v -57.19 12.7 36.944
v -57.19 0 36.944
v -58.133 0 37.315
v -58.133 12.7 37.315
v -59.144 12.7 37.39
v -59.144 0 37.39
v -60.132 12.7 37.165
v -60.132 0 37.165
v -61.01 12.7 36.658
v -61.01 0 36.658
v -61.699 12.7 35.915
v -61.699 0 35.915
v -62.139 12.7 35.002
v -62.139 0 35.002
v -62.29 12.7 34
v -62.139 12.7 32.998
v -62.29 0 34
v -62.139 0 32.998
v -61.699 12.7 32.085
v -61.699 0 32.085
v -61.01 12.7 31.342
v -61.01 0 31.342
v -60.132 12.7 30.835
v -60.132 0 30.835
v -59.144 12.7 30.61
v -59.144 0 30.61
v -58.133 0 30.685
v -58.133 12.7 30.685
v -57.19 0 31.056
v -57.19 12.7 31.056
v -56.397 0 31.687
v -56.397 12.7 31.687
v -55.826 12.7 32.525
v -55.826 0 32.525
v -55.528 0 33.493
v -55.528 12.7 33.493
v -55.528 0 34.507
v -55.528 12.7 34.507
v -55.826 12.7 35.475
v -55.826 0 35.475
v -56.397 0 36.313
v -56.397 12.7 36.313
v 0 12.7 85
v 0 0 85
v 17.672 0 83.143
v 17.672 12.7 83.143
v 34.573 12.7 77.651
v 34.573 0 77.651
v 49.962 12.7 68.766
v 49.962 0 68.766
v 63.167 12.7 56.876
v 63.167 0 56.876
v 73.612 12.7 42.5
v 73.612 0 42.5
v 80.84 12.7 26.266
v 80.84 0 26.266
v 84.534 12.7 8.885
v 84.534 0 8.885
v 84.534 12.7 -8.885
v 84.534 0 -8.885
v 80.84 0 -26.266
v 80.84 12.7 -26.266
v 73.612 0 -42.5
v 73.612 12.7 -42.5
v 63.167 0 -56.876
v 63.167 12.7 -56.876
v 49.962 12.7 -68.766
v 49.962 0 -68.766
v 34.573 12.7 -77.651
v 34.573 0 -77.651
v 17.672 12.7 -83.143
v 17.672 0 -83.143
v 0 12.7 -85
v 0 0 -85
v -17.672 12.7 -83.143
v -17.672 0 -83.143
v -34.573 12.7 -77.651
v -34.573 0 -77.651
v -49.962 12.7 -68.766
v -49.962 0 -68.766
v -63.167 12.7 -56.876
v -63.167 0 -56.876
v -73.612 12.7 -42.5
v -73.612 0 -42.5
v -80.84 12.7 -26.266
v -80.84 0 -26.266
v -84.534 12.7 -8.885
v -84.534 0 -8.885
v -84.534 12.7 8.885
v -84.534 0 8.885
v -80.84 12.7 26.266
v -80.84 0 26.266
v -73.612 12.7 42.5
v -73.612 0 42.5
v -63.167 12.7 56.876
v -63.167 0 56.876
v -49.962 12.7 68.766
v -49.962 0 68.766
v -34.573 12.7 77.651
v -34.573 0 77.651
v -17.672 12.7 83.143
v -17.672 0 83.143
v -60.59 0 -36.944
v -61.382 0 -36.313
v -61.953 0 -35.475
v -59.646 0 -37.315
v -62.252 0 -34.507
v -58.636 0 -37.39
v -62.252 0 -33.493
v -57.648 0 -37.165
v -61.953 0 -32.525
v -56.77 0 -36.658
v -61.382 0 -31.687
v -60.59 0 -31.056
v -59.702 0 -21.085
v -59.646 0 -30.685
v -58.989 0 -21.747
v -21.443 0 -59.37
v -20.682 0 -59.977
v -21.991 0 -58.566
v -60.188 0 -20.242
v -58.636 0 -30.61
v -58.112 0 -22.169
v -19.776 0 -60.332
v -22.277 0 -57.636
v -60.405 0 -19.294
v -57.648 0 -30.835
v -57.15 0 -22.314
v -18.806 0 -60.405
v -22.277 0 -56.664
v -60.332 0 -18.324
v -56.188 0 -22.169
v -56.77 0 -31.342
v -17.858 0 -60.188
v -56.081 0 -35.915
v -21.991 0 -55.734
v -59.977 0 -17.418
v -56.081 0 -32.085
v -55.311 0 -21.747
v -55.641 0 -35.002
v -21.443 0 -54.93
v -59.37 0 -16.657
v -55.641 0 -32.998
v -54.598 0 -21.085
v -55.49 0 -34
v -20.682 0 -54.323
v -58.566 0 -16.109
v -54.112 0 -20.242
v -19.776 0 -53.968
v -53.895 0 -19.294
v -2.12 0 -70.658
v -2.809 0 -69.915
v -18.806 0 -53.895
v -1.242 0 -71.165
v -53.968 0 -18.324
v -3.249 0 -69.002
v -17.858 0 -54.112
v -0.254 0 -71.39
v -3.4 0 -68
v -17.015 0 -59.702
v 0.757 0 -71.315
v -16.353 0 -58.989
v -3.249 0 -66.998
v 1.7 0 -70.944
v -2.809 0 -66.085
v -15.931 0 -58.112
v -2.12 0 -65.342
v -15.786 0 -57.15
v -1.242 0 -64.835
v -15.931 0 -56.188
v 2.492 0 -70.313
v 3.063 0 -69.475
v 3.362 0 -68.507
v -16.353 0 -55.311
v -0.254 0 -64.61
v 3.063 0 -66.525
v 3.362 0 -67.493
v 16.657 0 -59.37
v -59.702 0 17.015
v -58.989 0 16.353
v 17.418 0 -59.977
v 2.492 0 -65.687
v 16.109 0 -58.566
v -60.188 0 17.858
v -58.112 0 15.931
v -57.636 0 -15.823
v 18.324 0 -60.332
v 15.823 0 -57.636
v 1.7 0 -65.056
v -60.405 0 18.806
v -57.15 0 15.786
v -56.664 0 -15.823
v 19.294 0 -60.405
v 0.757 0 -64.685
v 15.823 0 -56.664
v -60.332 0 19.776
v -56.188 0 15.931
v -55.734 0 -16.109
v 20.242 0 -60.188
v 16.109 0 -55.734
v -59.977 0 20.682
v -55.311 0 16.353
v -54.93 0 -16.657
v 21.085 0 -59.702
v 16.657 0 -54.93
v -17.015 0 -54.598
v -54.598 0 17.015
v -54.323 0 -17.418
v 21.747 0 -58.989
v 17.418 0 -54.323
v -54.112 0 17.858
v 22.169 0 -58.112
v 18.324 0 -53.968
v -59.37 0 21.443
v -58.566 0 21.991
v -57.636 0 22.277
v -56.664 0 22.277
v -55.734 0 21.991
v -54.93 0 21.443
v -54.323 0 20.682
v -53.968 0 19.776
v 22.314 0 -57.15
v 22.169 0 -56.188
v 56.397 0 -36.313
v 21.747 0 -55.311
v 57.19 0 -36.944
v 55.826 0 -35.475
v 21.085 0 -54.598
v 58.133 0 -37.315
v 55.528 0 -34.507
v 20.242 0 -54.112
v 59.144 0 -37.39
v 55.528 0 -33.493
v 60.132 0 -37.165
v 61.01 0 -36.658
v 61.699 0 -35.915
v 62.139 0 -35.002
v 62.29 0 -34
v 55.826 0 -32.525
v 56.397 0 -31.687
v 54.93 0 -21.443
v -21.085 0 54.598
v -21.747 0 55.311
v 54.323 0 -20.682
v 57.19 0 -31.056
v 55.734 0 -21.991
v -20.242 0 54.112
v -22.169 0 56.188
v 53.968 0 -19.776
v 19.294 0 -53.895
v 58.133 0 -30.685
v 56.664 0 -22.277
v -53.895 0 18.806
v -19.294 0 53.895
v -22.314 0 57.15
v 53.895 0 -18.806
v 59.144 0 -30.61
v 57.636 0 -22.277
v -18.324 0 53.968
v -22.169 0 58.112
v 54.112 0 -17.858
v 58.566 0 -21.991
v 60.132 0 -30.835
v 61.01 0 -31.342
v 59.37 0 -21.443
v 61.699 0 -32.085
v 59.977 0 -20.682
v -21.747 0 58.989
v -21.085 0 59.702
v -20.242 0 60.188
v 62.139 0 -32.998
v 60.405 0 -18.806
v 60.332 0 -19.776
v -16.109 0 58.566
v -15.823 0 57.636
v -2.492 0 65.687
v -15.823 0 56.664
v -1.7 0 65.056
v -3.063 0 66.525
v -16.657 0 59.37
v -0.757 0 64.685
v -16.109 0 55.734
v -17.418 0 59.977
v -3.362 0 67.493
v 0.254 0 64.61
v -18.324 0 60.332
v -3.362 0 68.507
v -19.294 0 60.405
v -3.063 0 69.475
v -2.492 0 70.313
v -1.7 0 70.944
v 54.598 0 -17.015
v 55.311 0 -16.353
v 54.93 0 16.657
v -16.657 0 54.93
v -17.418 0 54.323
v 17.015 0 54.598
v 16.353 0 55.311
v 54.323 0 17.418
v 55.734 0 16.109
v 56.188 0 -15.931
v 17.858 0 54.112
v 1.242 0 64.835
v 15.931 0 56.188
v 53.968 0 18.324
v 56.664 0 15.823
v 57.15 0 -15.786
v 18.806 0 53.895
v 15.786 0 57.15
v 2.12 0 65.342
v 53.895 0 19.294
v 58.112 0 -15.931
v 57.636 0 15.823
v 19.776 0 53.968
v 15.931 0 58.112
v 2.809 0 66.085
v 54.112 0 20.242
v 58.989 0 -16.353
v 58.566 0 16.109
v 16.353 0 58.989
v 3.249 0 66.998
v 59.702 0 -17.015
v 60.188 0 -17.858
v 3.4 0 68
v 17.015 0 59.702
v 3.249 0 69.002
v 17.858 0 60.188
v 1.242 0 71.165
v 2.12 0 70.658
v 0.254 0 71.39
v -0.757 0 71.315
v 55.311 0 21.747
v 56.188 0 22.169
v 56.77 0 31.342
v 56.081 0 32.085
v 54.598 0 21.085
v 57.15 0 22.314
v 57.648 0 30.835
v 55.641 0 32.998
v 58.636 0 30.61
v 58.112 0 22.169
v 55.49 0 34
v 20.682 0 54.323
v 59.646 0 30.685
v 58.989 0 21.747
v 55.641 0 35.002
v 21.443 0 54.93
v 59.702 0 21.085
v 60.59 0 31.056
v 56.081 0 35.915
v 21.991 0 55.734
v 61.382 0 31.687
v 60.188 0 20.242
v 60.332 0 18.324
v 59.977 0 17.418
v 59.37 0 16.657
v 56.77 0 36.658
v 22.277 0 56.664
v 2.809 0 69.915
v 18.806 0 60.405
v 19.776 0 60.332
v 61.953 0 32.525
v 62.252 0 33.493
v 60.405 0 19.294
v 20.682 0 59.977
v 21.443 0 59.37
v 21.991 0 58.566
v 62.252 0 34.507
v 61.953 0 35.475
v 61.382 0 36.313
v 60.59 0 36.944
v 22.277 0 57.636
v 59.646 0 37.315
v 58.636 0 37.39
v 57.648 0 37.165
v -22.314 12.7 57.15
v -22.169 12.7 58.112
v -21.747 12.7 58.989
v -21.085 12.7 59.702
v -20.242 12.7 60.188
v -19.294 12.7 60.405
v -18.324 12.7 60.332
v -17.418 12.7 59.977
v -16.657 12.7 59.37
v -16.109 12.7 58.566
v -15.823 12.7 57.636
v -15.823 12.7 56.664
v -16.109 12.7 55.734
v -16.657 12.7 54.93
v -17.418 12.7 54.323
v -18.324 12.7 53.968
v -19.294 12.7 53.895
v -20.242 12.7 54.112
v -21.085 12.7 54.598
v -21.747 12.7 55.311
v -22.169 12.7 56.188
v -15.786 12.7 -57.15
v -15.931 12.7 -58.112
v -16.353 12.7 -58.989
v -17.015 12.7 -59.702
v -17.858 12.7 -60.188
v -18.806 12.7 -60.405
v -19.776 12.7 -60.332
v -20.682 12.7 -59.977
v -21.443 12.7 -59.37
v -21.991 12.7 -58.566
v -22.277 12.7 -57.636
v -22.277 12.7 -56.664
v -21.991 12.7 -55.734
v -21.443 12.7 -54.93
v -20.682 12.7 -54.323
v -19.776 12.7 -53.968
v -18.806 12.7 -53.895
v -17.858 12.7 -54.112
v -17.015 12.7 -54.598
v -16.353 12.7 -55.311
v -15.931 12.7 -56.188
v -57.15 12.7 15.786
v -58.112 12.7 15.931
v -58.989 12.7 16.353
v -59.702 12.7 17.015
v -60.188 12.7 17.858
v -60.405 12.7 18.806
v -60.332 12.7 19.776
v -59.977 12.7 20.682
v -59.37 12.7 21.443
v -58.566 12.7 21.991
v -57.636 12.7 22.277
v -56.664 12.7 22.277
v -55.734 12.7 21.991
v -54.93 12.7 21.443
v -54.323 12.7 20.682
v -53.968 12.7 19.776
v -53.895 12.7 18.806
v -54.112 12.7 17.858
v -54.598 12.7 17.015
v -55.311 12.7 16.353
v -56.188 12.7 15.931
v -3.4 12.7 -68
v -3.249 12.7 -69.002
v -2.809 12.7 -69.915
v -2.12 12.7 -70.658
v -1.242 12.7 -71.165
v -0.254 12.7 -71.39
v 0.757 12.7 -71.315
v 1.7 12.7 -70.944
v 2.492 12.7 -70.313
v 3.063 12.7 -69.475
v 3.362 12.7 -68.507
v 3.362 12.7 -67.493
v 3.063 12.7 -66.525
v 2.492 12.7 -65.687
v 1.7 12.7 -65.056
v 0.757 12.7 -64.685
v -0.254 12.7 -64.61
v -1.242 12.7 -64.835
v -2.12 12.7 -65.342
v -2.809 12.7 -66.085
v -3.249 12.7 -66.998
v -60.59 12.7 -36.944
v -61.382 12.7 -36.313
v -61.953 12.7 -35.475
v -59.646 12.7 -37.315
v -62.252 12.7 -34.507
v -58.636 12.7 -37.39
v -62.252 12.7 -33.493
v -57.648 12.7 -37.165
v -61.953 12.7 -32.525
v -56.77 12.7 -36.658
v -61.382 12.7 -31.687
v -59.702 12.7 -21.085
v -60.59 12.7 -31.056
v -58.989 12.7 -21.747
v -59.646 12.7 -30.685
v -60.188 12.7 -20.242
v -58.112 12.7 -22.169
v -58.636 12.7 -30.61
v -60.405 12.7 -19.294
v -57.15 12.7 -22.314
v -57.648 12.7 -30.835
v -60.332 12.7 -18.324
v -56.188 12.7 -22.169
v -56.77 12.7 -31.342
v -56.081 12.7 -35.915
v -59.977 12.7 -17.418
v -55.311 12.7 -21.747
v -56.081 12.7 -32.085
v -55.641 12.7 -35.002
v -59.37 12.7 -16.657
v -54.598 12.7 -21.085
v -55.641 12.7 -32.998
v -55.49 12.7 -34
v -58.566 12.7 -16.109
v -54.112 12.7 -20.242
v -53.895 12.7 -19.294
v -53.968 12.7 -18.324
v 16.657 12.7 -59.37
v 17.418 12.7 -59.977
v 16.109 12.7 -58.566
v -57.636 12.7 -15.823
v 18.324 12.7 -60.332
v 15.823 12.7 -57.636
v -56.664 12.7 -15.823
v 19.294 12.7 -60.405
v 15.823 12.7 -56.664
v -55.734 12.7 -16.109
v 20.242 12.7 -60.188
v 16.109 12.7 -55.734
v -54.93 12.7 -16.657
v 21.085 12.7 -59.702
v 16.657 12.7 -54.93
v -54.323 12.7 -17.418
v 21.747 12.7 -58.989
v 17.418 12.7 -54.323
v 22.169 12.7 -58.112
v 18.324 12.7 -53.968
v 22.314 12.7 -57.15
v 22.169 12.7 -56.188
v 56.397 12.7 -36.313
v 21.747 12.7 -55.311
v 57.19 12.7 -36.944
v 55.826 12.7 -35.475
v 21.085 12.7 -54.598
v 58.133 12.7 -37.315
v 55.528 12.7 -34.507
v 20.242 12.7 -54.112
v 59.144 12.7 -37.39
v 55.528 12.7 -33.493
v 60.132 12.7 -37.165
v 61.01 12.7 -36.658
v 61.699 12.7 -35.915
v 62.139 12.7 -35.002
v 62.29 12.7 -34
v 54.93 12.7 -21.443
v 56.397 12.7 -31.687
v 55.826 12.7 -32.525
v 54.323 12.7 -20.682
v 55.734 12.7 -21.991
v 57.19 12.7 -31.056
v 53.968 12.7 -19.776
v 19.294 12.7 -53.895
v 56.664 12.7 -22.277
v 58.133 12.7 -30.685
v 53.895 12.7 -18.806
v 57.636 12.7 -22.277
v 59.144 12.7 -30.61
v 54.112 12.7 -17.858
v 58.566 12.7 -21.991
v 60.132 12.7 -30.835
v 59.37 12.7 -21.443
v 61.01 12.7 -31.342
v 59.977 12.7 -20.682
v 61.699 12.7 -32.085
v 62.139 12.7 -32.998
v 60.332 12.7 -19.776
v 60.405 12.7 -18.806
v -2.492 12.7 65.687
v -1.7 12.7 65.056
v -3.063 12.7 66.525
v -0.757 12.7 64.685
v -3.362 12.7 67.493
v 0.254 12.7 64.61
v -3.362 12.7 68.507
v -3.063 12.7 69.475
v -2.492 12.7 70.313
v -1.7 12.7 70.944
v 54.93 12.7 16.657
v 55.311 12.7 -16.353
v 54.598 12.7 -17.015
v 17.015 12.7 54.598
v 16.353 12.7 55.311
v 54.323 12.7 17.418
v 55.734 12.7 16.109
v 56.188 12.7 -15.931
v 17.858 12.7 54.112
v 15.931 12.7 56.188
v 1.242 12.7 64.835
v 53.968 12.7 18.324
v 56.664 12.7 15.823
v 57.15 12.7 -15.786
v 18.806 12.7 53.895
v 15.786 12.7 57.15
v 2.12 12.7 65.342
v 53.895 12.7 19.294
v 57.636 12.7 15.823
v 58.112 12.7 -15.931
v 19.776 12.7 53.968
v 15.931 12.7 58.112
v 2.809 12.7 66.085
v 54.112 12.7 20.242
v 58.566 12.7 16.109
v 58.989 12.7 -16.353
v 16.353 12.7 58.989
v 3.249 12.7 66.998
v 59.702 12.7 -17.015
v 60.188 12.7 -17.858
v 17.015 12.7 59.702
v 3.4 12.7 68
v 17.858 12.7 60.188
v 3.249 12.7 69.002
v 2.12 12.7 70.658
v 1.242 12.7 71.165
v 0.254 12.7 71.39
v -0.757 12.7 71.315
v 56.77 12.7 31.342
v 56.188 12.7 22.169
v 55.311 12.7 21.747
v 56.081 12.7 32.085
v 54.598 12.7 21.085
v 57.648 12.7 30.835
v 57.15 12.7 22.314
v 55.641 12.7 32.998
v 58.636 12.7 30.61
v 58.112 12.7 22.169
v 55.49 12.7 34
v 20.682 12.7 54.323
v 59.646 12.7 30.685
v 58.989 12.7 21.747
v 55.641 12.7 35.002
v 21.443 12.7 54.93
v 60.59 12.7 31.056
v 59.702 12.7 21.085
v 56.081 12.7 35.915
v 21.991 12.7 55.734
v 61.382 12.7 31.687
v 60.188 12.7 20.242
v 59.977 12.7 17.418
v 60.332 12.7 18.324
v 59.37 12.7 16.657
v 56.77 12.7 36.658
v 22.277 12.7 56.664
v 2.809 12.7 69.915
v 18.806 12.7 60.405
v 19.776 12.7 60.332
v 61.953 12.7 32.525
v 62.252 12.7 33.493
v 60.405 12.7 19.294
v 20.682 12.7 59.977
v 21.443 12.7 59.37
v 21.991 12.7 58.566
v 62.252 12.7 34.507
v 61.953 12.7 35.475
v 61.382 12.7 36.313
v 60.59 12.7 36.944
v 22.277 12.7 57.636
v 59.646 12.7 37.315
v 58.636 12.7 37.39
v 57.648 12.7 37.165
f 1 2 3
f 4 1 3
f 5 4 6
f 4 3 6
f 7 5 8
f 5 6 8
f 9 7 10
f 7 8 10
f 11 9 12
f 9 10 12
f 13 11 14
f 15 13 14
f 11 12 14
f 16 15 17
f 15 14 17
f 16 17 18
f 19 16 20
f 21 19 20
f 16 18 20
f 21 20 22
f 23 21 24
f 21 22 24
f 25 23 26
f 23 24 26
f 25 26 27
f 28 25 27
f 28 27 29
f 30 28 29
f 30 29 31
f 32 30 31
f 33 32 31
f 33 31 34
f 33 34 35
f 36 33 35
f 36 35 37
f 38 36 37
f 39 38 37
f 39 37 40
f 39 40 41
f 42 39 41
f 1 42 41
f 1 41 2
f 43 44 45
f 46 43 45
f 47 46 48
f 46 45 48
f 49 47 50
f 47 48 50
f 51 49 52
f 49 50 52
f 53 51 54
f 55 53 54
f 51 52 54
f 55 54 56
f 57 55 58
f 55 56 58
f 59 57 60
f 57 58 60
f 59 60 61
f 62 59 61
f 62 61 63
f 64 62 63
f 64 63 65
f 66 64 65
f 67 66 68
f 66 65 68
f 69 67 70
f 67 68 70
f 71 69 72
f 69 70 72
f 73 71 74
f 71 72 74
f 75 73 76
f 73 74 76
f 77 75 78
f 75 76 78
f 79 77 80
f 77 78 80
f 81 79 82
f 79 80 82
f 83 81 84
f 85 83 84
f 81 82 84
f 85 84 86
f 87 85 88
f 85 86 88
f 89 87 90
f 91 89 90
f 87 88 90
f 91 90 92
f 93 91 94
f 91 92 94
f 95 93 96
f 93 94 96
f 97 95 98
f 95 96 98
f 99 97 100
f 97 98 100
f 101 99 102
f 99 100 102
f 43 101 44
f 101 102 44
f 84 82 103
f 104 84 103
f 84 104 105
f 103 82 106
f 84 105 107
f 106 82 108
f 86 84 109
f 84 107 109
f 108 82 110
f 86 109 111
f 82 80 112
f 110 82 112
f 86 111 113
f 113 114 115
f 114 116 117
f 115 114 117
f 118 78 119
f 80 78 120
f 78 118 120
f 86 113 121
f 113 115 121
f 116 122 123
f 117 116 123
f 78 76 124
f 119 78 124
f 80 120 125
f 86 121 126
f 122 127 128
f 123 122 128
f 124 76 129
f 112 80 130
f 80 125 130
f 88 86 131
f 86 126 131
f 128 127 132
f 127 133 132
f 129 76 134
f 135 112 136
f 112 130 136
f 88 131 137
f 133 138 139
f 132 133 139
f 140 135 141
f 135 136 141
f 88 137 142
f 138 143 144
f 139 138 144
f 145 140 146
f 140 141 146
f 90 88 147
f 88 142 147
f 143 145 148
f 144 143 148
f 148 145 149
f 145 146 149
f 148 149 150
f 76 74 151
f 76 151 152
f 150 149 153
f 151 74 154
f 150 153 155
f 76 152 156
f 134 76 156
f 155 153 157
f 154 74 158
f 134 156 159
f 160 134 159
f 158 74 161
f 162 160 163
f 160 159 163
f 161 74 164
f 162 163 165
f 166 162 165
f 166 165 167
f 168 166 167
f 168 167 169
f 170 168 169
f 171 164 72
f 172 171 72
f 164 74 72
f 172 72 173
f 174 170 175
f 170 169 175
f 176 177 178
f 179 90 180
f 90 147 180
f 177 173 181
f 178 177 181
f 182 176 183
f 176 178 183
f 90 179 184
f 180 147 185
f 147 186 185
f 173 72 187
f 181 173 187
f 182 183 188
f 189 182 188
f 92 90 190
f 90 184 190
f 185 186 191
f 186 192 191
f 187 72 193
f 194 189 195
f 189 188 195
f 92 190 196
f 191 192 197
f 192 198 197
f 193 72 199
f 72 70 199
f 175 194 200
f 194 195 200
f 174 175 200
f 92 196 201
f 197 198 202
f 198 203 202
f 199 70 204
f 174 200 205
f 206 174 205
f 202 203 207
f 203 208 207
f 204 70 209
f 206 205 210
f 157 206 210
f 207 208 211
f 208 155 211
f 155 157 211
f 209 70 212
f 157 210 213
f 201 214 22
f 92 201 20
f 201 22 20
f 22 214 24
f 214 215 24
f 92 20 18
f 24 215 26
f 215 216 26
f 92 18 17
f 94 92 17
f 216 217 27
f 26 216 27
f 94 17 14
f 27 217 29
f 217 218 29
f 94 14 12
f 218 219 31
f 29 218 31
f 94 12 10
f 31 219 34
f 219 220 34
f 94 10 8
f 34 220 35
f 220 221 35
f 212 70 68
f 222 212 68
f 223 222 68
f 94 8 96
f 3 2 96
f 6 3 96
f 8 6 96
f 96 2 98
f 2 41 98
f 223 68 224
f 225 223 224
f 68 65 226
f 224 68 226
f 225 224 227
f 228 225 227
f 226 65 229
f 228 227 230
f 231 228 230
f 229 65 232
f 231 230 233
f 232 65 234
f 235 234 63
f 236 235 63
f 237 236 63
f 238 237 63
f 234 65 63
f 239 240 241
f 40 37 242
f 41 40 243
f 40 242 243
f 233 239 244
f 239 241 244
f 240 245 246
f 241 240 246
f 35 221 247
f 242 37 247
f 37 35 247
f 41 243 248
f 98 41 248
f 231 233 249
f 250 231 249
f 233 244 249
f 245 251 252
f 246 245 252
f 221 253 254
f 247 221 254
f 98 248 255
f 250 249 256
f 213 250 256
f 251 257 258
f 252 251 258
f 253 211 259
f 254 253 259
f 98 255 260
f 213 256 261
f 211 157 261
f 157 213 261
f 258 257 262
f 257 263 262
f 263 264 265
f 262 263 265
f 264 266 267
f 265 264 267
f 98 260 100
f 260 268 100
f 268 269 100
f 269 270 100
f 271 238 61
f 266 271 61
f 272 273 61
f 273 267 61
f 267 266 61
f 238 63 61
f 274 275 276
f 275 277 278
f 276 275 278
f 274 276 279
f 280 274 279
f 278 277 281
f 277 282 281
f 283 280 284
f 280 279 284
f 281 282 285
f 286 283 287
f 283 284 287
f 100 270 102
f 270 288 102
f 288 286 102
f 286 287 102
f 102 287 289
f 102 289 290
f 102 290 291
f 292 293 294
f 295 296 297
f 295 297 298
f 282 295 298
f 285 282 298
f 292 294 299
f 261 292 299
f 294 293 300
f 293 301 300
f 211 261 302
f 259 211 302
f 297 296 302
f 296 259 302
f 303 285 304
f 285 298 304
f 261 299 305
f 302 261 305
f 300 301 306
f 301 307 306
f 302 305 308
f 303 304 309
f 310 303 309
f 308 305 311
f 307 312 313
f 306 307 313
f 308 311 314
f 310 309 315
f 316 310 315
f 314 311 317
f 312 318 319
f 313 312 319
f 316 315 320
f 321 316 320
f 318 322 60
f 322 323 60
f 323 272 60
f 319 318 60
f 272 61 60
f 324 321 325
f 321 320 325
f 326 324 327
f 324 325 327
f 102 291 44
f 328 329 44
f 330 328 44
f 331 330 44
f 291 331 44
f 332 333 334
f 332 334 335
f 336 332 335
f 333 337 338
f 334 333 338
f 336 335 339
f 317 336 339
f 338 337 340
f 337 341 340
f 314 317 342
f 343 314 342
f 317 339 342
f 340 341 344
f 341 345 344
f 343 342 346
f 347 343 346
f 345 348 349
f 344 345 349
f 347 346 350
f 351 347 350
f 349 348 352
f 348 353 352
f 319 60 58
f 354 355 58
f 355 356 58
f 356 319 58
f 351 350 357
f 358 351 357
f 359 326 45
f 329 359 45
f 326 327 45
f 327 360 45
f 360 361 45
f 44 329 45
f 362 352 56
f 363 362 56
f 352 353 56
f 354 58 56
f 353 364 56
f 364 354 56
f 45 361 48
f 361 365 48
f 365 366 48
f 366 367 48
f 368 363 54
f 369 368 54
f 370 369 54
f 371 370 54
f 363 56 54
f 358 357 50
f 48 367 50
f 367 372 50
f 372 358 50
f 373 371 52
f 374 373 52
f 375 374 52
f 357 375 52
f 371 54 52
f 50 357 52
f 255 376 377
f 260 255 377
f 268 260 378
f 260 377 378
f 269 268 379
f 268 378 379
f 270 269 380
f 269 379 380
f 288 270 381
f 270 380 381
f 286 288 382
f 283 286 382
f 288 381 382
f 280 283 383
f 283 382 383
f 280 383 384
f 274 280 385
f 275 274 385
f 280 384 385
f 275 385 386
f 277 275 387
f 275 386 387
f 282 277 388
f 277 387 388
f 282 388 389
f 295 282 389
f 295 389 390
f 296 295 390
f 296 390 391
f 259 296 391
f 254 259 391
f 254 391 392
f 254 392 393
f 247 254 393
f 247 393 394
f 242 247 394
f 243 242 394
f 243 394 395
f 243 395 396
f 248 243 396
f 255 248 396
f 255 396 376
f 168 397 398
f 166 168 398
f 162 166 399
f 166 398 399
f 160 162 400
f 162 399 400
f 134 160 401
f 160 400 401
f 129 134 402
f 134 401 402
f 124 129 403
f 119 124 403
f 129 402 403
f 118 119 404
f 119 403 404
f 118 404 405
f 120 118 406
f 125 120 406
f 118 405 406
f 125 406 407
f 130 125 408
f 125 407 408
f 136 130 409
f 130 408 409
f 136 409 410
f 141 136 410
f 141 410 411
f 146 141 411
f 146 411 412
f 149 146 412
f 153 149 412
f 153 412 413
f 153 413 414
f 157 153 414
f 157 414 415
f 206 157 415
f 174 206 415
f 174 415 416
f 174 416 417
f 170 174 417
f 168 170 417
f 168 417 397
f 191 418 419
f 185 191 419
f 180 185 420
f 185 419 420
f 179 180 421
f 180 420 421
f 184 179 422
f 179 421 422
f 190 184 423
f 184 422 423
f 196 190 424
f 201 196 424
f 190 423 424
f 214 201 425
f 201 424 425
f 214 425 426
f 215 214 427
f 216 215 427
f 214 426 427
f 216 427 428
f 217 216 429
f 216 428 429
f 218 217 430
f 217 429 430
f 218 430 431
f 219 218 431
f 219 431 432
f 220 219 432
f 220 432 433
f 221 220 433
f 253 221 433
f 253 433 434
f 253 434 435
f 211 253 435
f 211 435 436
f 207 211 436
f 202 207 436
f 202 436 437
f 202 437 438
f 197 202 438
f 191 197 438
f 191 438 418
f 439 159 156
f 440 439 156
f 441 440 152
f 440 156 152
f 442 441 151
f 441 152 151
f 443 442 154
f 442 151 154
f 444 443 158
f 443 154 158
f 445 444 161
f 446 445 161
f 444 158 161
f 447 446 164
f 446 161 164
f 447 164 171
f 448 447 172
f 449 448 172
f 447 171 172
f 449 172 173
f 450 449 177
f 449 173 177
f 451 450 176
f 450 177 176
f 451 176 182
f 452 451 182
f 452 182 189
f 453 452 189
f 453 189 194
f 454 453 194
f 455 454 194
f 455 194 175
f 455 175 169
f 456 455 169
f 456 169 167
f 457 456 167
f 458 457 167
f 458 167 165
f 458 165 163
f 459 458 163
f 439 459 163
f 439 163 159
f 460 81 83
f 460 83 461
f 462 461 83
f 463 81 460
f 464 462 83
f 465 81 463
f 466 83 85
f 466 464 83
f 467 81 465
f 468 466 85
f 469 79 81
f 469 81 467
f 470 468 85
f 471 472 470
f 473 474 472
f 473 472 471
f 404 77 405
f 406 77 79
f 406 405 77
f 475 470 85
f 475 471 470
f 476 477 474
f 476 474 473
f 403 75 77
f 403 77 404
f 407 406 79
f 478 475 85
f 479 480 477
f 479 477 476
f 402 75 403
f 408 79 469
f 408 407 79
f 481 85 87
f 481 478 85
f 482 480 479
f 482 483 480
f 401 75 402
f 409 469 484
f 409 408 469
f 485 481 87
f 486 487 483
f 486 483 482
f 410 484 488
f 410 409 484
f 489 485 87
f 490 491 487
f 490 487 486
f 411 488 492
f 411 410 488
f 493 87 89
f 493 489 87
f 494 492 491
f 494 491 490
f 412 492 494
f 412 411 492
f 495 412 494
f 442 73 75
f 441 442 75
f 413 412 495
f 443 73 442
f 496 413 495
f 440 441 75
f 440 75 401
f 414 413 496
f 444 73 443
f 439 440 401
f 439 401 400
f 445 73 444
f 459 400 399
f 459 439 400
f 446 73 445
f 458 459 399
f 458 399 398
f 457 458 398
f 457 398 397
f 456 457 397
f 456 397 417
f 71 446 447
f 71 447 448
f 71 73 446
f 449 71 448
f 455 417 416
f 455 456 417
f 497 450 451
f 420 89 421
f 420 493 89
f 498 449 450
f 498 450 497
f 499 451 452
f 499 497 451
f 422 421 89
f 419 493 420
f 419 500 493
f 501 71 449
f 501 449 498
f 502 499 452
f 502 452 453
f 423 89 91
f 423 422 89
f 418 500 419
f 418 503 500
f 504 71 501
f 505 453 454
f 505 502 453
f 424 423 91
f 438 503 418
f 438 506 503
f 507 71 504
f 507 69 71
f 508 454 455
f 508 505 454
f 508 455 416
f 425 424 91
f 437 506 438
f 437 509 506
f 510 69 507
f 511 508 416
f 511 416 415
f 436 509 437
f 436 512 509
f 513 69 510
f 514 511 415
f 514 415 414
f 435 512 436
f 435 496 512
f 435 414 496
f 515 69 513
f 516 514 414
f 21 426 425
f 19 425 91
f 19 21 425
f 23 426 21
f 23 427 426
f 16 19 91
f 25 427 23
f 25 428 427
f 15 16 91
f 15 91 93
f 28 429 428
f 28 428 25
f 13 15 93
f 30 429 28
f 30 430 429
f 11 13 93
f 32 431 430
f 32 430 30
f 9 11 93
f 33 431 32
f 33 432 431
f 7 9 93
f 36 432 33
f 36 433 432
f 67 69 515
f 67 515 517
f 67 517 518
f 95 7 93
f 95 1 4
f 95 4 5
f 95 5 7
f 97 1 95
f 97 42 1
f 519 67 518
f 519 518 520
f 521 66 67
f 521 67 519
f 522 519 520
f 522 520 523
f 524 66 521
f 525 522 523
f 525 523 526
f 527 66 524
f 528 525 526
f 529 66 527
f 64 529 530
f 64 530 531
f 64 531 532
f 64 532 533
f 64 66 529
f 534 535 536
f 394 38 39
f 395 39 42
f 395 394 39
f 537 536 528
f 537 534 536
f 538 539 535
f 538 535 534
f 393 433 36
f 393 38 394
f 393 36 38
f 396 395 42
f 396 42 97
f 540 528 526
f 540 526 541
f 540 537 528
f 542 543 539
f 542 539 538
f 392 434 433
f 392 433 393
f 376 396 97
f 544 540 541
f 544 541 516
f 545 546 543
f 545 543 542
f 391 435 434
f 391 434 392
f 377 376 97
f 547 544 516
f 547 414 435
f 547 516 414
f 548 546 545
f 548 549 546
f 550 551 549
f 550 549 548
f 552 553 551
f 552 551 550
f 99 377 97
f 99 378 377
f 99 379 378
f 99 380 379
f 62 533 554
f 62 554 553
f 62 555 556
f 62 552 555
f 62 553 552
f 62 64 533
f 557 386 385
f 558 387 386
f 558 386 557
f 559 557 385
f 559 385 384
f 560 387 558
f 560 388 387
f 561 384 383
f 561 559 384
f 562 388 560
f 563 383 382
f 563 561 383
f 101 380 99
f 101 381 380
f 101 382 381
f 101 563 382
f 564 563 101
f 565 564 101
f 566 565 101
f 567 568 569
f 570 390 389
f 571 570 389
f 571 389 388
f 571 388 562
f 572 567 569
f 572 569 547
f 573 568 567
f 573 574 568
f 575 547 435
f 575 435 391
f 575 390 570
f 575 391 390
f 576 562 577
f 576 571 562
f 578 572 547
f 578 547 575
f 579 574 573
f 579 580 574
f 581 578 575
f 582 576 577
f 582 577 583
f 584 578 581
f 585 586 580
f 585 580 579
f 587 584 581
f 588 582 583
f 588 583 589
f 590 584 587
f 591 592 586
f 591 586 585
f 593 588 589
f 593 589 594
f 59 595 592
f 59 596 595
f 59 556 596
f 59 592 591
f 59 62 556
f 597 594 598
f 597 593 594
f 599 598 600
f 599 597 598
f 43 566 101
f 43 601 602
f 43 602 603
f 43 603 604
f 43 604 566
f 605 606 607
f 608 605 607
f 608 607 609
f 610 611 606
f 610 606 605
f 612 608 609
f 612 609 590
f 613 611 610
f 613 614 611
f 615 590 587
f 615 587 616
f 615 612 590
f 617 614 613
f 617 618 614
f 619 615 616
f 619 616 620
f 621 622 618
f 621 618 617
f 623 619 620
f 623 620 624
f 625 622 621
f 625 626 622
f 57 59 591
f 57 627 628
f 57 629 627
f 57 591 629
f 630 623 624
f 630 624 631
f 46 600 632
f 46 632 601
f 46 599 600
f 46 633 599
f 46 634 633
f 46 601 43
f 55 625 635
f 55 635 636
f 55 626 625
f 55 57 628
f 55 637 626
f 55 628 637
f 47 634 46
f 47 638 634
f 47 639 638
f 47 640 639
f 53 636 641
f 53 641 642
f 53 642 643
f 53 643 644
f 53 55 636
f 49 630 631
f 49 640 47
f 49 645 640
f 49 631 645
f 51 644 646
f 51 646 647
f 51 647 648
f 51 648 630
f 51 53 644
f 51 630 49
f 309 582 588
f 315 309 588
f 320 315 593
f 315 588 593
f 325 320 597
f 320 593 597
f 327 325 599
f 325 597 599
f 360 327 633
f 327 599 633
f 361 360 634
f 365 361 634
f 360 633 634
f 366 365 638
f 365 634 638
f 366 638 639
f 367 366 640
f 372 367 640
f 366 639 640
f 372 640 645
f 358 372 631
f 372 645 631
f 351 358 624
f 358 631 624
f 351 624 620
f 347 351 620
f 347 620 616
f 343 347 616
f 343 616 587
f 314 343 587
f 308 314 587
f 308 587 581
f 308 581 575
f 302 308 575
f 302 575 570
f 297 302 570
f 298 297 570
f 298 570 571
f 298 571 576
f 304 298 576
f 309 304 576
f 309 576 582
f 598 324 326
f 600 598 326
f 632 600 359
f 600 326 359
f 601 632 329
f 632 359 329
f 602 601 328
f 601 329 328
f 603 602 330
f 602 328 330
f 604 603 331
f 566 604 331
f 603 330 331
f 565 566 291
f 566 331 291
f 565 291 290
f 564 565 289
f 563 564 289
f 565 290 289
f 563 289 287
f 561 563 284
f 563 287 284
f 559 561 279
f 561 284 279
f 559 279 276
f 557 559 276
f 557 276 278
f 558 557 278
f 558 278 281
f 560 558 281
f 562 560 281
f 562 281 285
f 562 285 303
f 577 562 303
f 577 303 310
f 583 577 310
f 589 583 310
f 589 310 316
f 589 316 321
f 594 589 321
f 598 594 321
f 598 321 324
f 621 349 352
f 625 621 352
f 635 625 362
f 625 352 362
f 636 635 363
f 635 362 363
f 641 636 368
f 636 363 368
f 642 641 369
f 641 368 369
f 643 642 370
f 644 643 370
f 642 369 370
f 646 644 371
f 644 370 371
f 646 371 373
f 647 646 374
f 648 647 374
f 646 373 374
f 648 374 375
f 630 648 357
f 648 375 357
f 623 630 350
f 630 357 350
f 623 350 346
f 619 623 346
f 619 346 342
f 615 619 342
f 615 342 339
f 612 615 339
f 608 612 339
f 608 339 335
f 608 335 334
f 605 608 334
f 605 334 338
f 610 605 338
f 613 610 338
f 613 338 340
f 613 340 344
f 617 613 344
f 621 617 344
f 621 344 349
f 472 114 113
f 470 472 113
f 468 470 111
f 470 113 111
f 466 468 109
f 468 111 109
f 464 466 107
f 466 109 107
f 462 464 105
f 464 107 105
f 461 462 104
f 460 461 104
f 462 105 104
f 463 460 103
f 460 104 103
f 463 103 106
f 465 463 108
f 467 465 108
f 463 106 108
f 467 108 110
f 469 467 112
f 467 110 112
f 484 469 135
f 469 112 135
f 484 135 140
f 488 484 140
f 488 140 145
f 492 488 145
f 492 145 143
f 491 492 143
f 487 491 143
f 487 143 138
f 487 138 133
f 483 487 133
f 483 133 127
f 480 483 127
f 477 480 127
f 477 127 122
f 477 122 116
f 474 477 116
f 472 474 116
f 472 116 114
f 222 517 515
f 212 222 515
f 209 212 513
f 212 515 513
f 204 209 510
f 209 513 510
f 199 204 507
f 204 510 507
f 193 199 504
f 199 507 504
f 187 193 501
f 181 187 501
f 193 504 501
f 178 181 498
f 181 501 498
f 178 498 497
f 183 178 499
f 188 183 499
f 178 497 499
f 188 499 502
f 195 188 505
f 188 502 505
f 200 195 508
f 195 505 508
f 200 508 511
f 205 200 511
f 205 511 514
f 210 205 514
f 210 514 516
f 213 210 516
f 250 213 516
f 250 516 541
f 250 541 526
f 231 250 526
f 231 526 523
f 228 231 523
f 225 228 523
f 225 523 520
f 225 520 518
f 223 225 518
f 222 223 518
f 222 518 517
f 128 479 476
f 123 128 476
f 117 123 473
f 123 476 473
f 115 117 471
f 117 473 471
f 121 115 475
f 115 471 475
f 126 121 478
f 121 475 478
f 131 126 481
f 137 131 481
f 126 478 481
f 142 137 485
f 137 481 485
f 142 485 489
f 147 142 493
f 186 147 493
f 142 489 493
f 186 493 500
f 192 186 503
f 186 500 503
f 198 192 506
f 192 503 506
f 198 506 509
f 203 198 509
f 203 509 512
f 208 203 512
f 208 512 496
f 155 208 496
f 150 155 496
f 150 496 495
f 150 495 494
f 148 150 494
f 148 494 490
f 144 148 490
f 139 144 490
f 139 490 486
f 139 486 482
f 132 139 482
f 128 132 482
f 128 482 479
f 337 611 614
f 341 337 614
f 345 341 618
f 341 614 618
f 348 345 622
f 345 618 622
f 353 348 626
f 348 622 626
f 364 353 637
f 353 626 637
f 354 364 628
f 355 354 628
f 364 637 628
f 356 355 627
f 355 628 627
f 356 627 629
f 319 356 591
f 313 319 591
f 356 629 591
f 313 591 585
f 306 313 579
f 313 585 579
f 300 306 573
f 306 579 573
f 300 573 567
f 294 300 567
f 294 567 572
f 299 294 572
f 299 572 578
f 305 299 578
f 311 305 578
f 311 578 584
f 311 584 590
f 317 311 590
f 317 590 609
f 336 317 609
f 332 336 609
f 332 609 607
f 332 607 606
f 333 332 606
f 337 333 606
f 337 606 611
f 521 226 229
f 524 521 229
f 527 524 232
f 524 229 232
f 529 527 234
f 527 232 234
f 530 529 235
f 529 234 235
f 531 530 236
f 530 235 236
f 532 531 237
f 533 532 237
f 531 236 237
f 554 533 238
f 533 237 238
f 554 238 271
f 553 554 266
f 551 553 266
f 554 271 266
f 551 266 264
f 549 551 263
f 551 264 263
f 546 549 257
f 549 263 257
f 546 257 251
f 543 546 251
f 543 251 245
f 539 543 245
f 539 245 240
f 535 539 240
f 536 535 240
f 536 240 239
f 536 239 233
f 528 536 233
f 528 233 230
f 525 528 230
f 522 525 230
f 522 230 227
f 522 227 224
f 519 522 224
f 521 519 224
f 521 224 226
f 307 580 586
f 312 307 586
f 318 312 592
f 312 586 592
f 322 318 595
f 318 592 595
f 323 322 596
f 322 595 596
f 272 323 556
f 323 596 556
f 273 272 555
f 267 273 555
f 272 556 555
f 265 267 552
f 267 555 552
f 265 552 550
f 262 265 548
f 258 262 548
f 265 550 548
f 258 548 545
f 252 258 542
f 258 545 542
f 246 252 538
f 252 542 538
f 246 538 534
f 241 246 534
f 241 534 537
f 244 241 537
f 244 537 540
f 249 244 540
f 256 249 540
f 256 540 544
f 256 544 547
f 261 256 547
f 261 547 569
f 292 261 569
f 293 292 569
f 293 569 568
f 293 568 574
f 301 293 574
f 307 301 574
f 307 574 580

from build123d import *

# Parameters (mm, degrees)
SKETCH1_R                = 85
BOSS_EXTRUDE1_DEPTH      = 12.7
M8X1_25_TAPPED_HOLE1_D   = 6.8
CIRPATTERN3_COUNT        = 6
F_5_16_18_TAPPED_HOLE1_D = 6.5278
CIRPATTERN2_COUNT        = 4


with BuildPart() as part:
    # Sketch1 → Boss-Extrude1 (new body)
    with BuildSketch(Plane(origin=(0, 0, 0), x_dir=(1, 0, 0), z_dir=(0, 1, 0))):
        with Locations(Location((0, 0, 0), (0, 0, 270))):
            Circle(SKETCH1_R)
    extrude(amount=BOSS_EXTRUDE1_DEPTH)

    # M8x1.25 Tapped Hole1 (through all)
    with Locations(Plane(origin=(0, 12.7, 0), x_dir=(1, 0, 0), z_dir=(0, 1, 0))):
        with Locations((0, 68)):
            m8x1_25_tapped_hole1 = Hole(M8X1_25_TAPPED_HOLE1_D / 2)

    # CirPattern3: M8x1.25 Tapped Hole1 ×6 about axis
    cirpattern3_axis = Axis((0, 0, 0), (0, 1, 0))
    for i in range(1, CIRPATTERN3_COUNT):
        add(m8x1_25_tapped_hole1.rotate(cirpattern3_axis, i * 360 / CIRPATTERN3_COUNT), mode=Mode.SUBTRACT)

    # 5/16-18 Tapped Hole1 (through all)
    with Locations(Plane(origin=(0, 0, 0), x_dir=(-1, 0, 0), z_dir=(0, -1, 0))):
        with Locations((-19.049999999, 57.15), (19.049999999, 57.15)):
            f_5_16_18_tapped_hole1 = Hole(F_5_16_18_TAPPED_HOLE1_D / 2)

    # CirPattern2: 5/16-18 Tapped Hole1 ×4 about axis
    cirpattern2_axis = Axis((0, 0, 0), (0, 1, 0))
    for i in range(1, CIRPATTERN2_COUNT):
        add(f_5_16_18_tapped_hole1.rotate(cirpattern2_axis, i * 360 / CIRPATTERN2_COUNT), mode=Mode.SUBTRACT)


solid = part.part
